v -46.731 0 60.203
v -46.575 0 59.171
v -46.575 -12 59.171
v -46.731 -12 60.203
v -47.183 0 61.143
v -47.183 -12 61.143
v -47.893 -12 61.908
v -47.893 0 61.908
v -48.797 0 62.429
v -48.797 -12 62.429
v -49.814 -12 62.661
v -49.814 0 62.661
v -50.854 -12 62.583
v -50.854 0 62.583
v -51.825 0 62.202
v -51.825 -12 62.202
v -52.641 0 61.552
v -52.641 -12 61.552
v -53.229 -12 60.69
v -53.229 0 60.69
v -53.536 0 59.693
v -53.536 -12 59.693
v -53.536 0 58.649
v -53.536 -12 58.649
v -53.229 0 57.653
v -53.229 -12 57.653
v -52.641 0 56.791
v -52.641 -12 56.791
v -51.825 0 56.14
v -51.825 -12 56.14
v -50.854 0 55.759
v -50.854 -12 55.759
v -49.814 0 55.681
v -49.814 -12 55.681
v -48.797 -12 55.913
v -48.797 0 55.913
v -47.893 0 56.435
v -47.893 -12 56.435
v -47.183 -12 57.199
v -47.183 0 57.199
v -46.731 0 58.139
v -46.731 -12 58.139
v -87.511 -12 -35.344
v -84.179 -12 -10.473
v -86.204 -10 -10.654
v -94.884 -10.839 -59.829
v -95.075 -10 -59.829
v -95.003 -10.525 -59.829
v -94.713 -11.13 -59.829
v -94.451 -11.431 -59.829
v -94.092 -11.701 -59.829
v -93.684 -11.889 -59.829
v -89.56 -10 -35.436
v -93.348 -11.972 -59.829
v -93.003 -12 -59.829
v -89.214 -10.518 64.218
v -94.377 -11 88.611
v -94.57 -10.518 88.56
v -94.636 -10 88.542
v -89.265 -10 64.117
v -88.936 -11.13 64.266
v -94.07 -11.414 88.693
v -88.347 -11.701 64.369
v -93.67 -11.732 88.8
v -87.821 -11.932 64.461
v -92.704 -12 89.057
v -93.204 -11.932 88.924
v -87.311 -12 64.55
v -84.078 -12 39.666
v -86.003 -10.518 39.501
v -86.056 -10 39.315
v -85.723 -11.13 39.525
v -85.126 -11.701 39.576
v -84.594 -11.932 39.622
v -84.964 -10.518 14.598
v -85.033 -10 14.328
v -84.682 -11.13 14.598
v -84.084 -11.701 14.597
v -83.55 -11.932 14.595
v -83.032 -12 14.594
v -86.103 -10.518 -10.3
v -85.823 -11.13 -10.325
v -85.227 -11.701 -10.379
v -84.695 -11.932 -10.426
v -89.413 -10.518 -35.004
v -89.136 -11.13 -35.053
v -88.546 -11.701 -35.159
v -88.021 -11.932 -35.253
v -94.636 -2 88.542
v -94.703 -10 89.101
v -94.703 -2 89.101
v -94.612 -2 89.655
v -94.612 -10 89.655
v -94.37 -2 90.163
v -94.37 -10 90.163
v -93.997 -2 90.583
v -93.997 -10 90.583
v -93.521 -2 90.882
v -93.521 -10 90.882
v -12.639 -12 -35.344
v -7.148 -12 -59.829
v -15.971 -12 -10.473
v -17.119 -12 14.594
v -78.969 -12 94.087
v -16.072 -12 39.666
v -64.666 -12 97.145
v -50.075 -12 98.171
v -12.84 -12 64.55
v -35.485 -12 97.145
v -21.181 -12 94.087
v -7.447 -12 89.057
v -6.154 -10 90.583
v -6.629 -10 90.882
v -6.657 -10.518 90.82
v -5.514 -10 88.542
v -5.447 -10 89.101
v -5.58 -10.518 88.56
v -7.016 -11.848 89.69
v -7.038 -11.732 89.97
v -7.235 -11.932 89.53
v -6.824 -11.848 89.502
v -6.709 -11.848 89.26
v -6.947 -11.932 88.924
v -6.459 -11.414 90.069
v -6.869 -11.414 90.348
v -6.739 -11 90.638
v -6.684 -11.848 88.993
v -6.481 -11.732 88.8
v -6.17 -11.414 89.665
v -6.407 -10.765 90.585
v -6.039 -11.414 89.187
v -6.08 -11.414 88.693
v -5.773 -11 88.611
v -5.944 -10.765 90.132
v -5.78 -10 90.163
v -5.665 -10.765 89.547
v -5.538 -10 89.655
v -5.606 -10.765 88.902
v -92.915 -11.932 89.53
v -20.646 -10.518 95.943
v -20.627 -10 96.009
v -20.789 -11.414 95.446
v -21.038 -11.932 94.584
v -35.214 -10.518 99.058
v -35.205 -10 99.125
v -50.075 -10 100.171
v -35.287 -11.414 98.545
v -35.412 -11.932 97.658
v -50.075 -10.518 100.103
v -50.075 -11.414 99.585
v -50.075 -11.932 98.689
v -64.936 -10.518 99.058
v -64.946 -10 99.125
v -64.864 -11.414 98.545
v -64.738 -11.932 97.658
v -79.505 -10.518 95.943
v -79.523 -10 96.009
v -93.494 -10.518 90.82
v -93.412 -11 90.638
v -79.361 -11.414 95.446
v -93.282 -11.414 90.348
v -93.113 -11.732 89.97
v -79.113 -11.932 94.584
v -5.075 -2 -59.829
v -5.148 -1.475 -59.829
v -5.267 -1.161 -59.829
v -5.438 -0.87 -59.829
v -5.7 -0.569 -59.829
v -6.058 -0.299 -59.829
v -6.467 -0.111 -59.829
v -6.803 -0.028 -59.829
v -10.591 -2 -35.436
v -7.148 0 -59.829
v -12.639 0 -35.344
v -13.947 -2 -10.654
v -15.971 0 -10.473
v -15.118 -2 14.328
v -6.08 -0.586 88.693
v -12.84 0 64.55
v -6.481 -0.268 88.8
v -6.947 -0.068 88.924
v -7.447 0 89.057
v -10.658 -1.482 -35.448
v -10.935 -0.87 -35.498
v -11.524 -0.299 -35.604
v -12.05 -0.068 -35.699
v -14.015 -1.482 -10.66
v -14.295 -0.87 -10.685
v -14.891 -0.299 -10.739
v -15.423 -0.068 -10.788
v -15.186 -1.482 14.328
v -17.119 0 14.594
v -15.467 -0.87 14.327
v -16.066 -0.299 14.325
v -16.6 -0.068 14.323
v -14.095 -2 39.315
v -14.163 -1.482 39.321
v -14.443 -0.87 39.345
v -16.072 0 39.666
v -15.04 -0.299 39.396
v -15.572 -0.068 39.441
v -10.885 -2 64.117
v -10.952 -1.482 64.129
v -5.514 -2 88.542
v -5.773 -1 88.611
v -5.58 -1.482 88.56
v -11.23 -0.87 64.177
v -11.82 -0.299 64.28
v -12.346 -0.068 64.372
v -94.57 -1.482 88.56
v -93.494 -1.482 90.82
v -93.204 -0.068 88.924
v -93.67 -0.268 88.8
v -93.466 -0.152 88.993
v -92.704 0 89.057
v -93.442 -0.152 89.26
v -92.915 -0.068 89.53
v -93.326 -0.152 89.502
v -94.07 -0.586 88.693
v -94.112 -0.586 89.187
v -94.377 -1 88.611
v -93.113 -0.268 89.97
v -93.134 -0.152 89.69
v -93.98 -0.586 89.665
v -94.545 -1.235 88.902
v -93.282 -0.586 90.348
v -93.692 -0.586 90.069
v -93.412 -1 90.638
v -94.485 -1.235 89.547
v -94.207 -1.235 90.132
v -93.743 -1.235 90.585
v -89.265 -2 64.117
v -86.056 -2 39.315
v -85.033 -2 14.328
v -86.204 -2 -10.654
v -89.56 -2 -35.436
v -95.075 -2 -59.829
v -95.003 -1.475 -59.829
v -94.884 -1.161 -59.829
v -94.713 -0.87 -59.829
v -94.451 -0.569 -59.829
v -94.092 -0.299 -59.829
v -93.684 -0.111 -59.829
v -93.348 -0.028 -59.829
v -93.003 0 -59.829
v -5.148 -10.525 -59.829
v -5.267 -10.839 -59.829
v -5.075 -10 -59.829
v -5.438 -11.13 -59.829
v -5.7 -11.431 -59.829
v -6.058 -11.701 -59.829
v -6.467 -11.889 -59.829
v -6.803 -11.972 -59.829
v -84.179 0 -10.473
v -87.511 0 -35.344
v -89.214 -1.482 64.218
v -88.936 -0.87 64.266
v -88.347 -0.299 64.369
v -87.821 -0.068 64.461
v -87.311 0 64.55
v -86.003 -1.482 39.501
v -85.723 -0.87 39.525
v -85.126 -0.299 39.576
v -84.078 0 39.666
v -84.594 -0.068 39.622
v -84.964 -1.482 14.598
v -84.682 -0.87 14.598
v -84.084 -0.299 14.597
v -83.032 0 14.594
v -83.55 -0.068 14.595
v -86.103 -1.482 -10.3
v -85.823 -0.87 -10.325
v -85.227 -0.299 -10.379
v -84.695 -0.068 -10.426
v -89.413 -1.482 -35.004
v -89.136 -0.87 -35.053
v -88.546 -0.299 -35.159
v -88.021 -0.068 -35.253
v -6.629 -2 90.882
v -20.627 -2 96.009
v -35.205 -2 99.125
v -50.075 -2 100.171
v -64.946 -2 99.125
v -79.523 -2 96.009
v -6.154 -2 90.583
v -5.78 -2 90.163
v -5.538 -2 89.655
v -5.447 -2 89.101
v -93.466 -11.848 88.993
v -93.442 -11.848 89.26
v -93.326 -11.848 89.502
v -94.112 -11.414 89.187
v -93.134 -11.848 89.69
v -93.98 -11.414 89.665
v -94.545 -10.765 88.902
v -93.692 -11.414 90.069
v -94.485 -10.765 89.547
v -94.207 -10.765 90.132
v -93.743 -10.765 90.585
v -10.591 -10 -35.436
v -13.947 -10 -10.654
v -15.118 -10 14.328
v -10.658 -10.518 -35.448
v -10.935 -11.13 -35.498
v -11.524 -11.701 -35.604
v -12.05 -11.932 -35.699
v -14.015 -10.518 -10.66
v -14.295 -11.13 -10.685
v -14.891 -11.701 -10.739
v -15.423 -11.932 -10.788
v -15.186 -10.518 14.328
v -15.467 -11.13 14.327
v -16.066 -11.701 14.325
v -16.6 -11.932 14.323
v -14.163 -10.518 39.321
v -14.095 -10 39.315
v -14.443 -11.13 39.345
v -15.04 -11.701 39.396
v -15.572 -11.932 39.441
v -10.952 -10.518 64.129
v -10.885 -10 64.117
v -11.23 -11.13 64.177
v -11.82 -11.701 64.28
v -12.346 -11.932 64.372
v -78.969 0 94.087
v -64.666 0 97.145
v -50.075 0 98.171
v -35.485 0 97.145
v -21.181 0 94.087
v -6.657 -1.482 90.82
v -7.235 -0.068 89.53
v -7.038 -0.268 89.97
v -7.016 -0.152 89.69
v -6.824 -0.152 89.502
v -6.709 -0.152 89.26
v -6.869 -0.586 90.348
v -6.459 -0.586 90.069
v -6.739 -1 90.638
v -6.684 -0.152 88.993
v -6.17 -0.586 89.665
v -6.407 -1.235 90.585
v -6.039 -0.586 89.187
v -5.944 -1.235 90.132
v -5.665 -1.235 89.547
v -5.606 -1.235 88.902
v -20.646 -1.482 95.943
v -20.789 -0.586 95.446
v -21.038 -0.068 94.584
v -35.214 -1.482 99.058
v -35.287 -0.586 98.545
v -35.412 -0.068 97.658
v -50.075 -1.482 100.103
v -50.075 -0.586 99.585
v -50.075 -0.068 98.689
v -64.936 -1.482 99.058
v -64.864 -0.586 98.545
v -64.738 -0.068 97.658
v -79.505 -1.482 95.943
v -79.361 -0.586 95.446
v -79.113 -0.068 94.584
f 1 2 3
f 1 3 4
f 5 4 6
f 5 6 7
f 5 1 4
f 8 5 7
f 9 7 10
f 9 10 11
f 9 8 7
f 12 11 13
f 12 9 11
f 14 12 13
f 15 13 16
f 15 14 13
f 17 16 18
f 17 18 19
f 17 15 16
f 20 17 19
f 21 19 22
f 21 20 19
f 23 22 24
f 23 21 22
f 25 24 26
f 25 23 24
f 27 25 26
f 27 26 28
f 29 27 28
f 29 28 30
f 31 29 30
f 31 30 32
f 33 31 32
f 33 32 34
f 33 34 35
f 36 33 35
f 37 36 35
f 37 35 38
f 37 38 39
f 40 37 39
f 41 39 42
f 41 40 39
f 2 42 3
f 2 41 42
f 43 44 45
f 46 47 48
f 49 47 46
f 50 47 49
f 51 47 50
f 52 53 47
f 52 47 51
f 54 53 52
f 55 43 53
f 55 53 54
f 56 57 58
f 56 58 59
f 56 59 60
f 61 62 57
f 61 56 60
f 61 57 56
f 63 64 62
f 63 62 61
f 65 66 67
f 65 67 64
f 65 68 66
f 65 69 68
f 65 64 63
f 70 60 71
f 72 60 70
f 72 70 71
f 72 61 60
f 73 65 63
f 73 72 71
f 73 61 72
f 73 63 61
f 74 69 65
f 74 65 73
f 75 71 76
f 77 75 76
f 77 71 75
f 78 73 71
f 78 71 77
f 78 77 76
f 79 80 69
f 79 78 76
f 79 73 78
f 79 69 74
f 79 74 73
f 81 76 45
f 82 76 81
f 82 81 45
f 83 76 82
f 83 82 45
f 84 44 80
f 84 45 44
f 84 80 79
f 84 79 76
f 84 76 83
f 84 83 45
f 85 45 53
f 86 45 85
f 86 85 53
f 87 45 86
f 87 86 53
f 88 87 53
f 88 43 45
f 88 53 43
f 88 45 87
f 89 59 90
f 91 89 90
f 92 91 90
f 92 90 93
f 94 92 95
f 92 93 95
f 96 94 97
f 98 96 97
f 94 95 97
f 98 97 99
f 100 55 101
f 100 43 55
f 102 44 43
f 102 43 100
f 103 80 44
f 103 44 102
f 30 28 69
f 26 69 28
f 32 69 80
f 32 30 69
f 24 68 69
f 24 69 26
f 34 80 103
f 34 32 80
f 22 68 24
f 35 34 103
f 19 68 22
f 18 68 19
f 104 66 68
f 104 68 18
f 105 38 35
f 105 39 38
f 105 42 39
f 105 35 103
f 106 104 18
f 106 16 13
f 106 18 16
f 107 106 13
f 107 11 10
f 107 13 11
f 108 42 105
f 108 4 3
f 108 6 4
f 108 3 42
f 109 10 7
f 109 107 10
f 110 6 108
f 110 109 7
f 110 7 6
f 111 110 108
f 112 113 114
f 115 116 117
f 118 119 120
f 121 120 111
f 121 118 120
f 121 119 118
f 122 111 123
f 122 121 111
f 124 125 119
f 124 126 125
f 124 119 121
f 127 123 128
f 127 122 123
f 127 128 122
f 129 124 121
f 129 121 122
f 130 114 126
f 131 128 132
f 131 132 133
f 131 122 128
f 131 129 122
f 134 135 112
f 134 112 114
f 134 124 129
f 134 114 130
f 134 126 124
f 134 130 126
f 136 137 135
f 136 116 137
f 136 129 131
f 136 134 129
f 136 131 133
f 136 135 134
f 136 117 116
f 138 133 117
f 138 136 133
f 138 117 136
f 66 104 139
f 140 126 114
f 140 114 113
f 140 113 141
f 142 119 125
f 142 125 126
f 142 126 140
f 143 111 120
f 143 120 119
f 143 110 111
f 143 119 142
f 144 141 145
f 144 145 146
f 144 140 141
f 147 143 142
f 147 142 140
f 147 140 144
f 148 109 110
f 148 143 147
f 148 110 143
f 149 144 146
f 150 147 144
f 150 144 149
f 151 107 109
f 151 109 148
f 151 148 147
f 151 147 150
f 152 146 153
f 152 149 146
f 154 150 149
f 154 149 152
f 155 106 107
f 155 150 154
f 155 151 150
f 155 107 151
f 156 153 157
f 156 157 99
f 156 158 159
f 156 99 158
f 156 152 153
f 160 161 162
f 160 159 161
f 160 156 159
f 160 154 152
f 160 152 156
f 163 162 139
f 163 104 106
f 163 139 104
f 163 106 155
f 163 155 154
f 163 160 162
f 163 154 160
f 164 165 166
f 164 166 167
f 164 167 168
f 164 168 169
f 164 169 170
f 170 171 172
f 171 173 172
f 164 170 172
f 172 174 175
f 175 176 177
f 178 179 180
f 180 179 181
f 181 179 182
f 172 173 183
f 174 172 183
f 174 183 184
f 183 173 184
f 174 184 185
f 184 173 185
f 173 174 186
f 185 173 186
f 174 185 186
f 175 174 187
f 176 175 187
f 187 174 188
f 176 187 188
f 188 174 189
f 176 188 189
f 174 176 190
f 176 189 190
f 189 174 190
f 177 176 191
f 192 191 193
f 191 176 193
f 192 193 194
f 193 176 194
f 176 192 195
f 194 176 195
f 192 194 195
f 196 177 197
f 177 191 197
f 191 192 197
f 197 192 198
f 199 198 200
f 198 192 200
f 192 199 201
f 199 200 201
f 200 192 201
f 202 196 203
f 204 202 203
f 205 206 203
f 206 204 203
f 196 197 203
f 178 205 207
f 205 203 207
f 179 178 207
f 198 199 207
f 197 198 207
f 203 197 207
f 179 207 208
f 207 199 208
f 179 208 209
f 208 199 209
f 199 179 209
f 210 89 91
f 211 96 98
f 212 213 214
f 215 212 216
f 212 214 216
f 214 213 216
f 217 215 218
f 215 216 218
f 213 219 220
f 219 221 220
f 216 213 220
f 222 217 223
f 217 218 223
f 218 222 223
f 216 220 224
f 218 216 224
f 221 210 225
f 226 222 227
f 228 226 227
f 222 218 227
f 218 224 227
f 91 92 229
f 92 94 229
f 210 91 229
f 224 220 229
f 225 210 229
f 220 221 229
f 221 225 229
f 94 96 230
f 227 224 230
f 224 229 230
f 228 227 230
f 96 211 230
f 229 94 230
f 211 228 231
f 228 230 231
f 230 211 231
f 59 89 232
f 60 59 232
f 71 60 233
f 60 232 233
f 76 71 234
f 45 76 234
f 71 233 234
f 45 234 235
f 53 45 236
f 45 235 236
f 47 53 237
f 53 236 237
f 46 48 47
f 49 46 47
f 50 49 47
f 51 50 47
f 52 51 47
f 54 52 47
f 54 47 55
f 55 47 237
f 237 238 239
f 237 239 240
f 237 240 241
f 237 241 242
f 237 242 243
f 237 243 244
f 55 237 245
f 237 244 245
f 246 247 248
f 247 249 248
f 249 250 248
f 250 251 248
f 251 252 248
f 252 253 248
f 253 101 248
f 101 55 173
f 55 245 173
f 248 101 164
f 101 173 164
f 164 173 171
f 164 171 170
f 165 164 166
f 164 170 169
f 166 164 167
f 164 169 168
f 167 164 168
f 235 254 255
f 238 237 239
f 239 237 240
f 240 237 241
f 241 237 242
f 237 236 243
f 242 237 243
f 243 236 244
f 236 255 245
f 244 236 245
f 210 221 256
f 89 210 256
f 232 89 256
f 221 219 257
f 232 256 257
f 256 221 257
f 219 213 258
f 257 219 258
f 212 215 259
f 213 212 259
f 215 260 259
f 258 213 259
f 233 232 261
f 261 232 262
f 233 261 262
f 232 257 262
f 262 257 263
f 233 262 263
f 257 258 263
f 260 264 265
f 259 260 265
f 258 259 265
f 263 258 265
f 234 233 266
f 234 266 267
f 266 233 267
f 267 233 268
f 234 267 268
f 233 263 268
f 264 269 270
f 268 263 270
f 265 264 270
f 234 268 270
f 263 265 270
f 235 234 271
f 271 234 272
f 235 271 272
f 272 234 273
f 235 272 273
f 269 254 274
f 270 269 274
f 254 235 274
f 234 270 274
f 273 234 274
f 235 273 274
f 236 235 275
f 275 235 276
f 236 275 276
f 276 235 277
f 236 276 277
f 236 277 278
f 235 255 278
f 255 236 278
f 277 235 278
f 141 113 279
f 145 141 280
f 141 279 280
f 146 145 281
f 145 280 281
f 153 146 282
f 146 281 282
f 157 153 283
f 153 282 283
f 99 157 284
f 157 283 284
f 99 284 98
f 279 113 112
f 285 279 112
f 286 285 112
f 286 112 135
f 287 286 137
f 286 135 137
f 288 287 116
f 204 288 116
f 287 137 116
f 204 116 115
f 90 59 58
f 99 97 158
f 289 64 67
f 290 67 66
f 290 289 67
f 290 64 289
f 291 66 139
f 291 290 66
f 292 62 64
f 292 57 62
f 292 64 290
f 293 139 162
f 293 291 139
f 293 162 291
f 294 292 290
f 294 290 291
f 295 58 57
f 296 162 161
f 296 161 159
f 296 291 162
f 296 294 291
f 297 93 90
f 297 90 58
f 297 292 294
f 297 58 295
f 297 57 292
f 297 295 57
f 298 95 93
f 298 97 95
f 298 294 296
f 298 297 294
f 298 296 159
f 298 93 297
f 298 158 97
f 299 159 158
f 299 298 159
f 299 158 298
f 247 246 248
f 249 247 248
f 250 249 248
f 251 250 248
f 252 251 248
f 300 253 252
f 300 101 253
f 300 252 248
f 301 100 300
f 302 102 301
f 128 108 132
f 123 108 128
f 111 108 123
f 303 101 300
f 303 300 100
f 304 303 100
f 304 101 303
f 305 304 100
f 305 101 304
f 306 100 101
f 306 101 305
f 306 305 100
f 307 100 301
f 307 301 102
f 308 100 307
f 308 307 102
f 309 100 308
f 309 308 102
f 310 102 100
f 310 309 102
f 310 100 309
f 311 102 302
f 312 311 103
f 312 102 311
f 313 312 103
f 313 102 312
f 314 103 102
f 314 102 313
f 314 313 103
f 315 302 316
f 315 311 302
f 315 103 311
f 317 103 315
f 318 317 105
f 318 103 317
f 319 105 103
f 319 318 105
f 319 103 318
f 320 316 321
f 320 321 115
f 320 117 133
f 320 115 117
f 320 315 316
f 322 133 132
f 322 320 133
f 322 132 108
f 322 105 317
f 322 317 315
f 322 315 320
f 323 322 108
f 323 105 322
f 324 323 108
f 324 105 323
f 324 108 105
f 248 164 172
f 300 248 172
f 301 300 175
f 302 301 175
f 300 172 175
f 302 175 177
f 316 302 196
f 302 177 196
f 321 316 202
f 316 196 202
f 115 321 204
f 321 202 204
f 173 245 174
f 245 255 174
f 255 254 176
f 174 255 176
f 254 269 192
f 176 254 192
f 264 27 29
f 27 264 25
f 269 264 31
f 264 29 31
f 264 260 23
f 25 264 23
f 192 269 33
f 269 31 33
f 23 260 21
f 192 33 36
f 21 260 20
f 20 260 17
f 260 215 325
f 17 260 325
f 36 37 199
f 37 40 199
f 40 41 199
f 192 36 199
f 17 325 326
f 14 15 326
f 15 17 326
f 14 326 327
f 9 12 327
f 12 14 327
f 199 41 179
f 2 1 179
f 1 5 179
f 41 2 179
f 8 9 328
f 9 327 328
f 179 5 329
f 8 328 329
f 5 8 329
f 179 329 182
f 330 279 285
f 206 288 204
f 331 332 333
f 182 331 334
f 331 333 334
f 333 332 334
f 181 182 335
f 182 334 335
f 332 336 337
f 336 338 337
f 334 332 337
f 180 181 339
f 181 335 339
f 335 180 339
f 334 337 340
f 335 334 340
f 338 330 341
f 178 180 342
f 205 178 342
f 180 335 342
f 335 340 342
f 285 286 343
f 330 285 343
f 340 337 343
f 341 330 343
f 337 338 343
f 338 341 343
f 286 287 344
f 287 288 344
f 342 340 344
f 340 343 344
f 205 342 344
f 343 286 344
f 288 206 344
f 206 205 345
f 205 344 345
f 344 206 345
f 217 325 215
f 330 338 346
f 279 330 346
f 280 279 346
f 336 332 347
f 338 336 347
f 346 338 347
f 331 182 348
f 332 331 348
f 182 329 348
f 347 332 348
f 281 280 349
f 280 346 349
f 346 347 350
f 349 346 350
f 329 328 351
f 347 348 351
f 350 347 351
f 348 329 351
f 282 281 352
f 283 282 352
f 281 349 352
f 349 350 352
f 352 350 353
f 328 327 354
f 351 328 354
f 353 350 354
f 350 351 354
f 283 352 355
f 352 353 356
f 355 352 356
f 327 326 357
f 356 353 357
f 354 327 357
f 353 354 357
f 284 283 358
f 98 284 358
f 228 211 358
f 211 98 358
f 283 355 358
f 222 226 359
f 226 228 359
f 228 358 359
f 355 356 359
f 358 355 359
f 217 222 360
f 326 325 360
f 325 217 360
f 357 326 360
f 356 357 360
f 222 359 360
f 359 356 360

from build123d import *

# Parameters (mm, degrees)
F0_R     = 3.5
F1_DEPTH = 12
F2_R     = 2


with BuildPart() as f1:
    # F0 (on Front) → F1 (new body)
    with BuildSketch(Plane.XZ):
        with BuildLine():
            ThreePointArc((-95.075279, 90.171108), (-85.031423, 15.171108), (-95.075279, -59.828892))
            Line((-95.075279, -59.828892), (-5.075279, -59.828892))
            ThreePointArc((-5.075279, -59.828892), (-15.119136, 15.171108), (-5.075279, 90.171108))
            ThreePointArc((-5.075279, 90.171108), (-50.075279, 100.171108), (-95.075279, 90.171108))
        make_face()
        with Locations((-50.075279, 59.171108)):
            Circle(F0_R, mode=Mode.SUBTRACT)
    extrude(amount=F1_DEPTH)

    # F2
    f2_edges = [f1.edges().sort_by_distance(p)[0] for p in [
        (-50.075279, -12, 100.171108),
        (-50.075279, 0, 100.171108),
        (-15.119136, -12, 15.171108),
        (-15.119136, 0, 15.171108),
        (-5.075279, -6, 90.171108),
        (-95.075279, -6, 90.171108),
        (-85.031423, 0, 15.171108),
        (-85.031423, -12, 15.171108),
    ]]
    fillet(f2_edges, radius=F2_R)


solid = f1.part
